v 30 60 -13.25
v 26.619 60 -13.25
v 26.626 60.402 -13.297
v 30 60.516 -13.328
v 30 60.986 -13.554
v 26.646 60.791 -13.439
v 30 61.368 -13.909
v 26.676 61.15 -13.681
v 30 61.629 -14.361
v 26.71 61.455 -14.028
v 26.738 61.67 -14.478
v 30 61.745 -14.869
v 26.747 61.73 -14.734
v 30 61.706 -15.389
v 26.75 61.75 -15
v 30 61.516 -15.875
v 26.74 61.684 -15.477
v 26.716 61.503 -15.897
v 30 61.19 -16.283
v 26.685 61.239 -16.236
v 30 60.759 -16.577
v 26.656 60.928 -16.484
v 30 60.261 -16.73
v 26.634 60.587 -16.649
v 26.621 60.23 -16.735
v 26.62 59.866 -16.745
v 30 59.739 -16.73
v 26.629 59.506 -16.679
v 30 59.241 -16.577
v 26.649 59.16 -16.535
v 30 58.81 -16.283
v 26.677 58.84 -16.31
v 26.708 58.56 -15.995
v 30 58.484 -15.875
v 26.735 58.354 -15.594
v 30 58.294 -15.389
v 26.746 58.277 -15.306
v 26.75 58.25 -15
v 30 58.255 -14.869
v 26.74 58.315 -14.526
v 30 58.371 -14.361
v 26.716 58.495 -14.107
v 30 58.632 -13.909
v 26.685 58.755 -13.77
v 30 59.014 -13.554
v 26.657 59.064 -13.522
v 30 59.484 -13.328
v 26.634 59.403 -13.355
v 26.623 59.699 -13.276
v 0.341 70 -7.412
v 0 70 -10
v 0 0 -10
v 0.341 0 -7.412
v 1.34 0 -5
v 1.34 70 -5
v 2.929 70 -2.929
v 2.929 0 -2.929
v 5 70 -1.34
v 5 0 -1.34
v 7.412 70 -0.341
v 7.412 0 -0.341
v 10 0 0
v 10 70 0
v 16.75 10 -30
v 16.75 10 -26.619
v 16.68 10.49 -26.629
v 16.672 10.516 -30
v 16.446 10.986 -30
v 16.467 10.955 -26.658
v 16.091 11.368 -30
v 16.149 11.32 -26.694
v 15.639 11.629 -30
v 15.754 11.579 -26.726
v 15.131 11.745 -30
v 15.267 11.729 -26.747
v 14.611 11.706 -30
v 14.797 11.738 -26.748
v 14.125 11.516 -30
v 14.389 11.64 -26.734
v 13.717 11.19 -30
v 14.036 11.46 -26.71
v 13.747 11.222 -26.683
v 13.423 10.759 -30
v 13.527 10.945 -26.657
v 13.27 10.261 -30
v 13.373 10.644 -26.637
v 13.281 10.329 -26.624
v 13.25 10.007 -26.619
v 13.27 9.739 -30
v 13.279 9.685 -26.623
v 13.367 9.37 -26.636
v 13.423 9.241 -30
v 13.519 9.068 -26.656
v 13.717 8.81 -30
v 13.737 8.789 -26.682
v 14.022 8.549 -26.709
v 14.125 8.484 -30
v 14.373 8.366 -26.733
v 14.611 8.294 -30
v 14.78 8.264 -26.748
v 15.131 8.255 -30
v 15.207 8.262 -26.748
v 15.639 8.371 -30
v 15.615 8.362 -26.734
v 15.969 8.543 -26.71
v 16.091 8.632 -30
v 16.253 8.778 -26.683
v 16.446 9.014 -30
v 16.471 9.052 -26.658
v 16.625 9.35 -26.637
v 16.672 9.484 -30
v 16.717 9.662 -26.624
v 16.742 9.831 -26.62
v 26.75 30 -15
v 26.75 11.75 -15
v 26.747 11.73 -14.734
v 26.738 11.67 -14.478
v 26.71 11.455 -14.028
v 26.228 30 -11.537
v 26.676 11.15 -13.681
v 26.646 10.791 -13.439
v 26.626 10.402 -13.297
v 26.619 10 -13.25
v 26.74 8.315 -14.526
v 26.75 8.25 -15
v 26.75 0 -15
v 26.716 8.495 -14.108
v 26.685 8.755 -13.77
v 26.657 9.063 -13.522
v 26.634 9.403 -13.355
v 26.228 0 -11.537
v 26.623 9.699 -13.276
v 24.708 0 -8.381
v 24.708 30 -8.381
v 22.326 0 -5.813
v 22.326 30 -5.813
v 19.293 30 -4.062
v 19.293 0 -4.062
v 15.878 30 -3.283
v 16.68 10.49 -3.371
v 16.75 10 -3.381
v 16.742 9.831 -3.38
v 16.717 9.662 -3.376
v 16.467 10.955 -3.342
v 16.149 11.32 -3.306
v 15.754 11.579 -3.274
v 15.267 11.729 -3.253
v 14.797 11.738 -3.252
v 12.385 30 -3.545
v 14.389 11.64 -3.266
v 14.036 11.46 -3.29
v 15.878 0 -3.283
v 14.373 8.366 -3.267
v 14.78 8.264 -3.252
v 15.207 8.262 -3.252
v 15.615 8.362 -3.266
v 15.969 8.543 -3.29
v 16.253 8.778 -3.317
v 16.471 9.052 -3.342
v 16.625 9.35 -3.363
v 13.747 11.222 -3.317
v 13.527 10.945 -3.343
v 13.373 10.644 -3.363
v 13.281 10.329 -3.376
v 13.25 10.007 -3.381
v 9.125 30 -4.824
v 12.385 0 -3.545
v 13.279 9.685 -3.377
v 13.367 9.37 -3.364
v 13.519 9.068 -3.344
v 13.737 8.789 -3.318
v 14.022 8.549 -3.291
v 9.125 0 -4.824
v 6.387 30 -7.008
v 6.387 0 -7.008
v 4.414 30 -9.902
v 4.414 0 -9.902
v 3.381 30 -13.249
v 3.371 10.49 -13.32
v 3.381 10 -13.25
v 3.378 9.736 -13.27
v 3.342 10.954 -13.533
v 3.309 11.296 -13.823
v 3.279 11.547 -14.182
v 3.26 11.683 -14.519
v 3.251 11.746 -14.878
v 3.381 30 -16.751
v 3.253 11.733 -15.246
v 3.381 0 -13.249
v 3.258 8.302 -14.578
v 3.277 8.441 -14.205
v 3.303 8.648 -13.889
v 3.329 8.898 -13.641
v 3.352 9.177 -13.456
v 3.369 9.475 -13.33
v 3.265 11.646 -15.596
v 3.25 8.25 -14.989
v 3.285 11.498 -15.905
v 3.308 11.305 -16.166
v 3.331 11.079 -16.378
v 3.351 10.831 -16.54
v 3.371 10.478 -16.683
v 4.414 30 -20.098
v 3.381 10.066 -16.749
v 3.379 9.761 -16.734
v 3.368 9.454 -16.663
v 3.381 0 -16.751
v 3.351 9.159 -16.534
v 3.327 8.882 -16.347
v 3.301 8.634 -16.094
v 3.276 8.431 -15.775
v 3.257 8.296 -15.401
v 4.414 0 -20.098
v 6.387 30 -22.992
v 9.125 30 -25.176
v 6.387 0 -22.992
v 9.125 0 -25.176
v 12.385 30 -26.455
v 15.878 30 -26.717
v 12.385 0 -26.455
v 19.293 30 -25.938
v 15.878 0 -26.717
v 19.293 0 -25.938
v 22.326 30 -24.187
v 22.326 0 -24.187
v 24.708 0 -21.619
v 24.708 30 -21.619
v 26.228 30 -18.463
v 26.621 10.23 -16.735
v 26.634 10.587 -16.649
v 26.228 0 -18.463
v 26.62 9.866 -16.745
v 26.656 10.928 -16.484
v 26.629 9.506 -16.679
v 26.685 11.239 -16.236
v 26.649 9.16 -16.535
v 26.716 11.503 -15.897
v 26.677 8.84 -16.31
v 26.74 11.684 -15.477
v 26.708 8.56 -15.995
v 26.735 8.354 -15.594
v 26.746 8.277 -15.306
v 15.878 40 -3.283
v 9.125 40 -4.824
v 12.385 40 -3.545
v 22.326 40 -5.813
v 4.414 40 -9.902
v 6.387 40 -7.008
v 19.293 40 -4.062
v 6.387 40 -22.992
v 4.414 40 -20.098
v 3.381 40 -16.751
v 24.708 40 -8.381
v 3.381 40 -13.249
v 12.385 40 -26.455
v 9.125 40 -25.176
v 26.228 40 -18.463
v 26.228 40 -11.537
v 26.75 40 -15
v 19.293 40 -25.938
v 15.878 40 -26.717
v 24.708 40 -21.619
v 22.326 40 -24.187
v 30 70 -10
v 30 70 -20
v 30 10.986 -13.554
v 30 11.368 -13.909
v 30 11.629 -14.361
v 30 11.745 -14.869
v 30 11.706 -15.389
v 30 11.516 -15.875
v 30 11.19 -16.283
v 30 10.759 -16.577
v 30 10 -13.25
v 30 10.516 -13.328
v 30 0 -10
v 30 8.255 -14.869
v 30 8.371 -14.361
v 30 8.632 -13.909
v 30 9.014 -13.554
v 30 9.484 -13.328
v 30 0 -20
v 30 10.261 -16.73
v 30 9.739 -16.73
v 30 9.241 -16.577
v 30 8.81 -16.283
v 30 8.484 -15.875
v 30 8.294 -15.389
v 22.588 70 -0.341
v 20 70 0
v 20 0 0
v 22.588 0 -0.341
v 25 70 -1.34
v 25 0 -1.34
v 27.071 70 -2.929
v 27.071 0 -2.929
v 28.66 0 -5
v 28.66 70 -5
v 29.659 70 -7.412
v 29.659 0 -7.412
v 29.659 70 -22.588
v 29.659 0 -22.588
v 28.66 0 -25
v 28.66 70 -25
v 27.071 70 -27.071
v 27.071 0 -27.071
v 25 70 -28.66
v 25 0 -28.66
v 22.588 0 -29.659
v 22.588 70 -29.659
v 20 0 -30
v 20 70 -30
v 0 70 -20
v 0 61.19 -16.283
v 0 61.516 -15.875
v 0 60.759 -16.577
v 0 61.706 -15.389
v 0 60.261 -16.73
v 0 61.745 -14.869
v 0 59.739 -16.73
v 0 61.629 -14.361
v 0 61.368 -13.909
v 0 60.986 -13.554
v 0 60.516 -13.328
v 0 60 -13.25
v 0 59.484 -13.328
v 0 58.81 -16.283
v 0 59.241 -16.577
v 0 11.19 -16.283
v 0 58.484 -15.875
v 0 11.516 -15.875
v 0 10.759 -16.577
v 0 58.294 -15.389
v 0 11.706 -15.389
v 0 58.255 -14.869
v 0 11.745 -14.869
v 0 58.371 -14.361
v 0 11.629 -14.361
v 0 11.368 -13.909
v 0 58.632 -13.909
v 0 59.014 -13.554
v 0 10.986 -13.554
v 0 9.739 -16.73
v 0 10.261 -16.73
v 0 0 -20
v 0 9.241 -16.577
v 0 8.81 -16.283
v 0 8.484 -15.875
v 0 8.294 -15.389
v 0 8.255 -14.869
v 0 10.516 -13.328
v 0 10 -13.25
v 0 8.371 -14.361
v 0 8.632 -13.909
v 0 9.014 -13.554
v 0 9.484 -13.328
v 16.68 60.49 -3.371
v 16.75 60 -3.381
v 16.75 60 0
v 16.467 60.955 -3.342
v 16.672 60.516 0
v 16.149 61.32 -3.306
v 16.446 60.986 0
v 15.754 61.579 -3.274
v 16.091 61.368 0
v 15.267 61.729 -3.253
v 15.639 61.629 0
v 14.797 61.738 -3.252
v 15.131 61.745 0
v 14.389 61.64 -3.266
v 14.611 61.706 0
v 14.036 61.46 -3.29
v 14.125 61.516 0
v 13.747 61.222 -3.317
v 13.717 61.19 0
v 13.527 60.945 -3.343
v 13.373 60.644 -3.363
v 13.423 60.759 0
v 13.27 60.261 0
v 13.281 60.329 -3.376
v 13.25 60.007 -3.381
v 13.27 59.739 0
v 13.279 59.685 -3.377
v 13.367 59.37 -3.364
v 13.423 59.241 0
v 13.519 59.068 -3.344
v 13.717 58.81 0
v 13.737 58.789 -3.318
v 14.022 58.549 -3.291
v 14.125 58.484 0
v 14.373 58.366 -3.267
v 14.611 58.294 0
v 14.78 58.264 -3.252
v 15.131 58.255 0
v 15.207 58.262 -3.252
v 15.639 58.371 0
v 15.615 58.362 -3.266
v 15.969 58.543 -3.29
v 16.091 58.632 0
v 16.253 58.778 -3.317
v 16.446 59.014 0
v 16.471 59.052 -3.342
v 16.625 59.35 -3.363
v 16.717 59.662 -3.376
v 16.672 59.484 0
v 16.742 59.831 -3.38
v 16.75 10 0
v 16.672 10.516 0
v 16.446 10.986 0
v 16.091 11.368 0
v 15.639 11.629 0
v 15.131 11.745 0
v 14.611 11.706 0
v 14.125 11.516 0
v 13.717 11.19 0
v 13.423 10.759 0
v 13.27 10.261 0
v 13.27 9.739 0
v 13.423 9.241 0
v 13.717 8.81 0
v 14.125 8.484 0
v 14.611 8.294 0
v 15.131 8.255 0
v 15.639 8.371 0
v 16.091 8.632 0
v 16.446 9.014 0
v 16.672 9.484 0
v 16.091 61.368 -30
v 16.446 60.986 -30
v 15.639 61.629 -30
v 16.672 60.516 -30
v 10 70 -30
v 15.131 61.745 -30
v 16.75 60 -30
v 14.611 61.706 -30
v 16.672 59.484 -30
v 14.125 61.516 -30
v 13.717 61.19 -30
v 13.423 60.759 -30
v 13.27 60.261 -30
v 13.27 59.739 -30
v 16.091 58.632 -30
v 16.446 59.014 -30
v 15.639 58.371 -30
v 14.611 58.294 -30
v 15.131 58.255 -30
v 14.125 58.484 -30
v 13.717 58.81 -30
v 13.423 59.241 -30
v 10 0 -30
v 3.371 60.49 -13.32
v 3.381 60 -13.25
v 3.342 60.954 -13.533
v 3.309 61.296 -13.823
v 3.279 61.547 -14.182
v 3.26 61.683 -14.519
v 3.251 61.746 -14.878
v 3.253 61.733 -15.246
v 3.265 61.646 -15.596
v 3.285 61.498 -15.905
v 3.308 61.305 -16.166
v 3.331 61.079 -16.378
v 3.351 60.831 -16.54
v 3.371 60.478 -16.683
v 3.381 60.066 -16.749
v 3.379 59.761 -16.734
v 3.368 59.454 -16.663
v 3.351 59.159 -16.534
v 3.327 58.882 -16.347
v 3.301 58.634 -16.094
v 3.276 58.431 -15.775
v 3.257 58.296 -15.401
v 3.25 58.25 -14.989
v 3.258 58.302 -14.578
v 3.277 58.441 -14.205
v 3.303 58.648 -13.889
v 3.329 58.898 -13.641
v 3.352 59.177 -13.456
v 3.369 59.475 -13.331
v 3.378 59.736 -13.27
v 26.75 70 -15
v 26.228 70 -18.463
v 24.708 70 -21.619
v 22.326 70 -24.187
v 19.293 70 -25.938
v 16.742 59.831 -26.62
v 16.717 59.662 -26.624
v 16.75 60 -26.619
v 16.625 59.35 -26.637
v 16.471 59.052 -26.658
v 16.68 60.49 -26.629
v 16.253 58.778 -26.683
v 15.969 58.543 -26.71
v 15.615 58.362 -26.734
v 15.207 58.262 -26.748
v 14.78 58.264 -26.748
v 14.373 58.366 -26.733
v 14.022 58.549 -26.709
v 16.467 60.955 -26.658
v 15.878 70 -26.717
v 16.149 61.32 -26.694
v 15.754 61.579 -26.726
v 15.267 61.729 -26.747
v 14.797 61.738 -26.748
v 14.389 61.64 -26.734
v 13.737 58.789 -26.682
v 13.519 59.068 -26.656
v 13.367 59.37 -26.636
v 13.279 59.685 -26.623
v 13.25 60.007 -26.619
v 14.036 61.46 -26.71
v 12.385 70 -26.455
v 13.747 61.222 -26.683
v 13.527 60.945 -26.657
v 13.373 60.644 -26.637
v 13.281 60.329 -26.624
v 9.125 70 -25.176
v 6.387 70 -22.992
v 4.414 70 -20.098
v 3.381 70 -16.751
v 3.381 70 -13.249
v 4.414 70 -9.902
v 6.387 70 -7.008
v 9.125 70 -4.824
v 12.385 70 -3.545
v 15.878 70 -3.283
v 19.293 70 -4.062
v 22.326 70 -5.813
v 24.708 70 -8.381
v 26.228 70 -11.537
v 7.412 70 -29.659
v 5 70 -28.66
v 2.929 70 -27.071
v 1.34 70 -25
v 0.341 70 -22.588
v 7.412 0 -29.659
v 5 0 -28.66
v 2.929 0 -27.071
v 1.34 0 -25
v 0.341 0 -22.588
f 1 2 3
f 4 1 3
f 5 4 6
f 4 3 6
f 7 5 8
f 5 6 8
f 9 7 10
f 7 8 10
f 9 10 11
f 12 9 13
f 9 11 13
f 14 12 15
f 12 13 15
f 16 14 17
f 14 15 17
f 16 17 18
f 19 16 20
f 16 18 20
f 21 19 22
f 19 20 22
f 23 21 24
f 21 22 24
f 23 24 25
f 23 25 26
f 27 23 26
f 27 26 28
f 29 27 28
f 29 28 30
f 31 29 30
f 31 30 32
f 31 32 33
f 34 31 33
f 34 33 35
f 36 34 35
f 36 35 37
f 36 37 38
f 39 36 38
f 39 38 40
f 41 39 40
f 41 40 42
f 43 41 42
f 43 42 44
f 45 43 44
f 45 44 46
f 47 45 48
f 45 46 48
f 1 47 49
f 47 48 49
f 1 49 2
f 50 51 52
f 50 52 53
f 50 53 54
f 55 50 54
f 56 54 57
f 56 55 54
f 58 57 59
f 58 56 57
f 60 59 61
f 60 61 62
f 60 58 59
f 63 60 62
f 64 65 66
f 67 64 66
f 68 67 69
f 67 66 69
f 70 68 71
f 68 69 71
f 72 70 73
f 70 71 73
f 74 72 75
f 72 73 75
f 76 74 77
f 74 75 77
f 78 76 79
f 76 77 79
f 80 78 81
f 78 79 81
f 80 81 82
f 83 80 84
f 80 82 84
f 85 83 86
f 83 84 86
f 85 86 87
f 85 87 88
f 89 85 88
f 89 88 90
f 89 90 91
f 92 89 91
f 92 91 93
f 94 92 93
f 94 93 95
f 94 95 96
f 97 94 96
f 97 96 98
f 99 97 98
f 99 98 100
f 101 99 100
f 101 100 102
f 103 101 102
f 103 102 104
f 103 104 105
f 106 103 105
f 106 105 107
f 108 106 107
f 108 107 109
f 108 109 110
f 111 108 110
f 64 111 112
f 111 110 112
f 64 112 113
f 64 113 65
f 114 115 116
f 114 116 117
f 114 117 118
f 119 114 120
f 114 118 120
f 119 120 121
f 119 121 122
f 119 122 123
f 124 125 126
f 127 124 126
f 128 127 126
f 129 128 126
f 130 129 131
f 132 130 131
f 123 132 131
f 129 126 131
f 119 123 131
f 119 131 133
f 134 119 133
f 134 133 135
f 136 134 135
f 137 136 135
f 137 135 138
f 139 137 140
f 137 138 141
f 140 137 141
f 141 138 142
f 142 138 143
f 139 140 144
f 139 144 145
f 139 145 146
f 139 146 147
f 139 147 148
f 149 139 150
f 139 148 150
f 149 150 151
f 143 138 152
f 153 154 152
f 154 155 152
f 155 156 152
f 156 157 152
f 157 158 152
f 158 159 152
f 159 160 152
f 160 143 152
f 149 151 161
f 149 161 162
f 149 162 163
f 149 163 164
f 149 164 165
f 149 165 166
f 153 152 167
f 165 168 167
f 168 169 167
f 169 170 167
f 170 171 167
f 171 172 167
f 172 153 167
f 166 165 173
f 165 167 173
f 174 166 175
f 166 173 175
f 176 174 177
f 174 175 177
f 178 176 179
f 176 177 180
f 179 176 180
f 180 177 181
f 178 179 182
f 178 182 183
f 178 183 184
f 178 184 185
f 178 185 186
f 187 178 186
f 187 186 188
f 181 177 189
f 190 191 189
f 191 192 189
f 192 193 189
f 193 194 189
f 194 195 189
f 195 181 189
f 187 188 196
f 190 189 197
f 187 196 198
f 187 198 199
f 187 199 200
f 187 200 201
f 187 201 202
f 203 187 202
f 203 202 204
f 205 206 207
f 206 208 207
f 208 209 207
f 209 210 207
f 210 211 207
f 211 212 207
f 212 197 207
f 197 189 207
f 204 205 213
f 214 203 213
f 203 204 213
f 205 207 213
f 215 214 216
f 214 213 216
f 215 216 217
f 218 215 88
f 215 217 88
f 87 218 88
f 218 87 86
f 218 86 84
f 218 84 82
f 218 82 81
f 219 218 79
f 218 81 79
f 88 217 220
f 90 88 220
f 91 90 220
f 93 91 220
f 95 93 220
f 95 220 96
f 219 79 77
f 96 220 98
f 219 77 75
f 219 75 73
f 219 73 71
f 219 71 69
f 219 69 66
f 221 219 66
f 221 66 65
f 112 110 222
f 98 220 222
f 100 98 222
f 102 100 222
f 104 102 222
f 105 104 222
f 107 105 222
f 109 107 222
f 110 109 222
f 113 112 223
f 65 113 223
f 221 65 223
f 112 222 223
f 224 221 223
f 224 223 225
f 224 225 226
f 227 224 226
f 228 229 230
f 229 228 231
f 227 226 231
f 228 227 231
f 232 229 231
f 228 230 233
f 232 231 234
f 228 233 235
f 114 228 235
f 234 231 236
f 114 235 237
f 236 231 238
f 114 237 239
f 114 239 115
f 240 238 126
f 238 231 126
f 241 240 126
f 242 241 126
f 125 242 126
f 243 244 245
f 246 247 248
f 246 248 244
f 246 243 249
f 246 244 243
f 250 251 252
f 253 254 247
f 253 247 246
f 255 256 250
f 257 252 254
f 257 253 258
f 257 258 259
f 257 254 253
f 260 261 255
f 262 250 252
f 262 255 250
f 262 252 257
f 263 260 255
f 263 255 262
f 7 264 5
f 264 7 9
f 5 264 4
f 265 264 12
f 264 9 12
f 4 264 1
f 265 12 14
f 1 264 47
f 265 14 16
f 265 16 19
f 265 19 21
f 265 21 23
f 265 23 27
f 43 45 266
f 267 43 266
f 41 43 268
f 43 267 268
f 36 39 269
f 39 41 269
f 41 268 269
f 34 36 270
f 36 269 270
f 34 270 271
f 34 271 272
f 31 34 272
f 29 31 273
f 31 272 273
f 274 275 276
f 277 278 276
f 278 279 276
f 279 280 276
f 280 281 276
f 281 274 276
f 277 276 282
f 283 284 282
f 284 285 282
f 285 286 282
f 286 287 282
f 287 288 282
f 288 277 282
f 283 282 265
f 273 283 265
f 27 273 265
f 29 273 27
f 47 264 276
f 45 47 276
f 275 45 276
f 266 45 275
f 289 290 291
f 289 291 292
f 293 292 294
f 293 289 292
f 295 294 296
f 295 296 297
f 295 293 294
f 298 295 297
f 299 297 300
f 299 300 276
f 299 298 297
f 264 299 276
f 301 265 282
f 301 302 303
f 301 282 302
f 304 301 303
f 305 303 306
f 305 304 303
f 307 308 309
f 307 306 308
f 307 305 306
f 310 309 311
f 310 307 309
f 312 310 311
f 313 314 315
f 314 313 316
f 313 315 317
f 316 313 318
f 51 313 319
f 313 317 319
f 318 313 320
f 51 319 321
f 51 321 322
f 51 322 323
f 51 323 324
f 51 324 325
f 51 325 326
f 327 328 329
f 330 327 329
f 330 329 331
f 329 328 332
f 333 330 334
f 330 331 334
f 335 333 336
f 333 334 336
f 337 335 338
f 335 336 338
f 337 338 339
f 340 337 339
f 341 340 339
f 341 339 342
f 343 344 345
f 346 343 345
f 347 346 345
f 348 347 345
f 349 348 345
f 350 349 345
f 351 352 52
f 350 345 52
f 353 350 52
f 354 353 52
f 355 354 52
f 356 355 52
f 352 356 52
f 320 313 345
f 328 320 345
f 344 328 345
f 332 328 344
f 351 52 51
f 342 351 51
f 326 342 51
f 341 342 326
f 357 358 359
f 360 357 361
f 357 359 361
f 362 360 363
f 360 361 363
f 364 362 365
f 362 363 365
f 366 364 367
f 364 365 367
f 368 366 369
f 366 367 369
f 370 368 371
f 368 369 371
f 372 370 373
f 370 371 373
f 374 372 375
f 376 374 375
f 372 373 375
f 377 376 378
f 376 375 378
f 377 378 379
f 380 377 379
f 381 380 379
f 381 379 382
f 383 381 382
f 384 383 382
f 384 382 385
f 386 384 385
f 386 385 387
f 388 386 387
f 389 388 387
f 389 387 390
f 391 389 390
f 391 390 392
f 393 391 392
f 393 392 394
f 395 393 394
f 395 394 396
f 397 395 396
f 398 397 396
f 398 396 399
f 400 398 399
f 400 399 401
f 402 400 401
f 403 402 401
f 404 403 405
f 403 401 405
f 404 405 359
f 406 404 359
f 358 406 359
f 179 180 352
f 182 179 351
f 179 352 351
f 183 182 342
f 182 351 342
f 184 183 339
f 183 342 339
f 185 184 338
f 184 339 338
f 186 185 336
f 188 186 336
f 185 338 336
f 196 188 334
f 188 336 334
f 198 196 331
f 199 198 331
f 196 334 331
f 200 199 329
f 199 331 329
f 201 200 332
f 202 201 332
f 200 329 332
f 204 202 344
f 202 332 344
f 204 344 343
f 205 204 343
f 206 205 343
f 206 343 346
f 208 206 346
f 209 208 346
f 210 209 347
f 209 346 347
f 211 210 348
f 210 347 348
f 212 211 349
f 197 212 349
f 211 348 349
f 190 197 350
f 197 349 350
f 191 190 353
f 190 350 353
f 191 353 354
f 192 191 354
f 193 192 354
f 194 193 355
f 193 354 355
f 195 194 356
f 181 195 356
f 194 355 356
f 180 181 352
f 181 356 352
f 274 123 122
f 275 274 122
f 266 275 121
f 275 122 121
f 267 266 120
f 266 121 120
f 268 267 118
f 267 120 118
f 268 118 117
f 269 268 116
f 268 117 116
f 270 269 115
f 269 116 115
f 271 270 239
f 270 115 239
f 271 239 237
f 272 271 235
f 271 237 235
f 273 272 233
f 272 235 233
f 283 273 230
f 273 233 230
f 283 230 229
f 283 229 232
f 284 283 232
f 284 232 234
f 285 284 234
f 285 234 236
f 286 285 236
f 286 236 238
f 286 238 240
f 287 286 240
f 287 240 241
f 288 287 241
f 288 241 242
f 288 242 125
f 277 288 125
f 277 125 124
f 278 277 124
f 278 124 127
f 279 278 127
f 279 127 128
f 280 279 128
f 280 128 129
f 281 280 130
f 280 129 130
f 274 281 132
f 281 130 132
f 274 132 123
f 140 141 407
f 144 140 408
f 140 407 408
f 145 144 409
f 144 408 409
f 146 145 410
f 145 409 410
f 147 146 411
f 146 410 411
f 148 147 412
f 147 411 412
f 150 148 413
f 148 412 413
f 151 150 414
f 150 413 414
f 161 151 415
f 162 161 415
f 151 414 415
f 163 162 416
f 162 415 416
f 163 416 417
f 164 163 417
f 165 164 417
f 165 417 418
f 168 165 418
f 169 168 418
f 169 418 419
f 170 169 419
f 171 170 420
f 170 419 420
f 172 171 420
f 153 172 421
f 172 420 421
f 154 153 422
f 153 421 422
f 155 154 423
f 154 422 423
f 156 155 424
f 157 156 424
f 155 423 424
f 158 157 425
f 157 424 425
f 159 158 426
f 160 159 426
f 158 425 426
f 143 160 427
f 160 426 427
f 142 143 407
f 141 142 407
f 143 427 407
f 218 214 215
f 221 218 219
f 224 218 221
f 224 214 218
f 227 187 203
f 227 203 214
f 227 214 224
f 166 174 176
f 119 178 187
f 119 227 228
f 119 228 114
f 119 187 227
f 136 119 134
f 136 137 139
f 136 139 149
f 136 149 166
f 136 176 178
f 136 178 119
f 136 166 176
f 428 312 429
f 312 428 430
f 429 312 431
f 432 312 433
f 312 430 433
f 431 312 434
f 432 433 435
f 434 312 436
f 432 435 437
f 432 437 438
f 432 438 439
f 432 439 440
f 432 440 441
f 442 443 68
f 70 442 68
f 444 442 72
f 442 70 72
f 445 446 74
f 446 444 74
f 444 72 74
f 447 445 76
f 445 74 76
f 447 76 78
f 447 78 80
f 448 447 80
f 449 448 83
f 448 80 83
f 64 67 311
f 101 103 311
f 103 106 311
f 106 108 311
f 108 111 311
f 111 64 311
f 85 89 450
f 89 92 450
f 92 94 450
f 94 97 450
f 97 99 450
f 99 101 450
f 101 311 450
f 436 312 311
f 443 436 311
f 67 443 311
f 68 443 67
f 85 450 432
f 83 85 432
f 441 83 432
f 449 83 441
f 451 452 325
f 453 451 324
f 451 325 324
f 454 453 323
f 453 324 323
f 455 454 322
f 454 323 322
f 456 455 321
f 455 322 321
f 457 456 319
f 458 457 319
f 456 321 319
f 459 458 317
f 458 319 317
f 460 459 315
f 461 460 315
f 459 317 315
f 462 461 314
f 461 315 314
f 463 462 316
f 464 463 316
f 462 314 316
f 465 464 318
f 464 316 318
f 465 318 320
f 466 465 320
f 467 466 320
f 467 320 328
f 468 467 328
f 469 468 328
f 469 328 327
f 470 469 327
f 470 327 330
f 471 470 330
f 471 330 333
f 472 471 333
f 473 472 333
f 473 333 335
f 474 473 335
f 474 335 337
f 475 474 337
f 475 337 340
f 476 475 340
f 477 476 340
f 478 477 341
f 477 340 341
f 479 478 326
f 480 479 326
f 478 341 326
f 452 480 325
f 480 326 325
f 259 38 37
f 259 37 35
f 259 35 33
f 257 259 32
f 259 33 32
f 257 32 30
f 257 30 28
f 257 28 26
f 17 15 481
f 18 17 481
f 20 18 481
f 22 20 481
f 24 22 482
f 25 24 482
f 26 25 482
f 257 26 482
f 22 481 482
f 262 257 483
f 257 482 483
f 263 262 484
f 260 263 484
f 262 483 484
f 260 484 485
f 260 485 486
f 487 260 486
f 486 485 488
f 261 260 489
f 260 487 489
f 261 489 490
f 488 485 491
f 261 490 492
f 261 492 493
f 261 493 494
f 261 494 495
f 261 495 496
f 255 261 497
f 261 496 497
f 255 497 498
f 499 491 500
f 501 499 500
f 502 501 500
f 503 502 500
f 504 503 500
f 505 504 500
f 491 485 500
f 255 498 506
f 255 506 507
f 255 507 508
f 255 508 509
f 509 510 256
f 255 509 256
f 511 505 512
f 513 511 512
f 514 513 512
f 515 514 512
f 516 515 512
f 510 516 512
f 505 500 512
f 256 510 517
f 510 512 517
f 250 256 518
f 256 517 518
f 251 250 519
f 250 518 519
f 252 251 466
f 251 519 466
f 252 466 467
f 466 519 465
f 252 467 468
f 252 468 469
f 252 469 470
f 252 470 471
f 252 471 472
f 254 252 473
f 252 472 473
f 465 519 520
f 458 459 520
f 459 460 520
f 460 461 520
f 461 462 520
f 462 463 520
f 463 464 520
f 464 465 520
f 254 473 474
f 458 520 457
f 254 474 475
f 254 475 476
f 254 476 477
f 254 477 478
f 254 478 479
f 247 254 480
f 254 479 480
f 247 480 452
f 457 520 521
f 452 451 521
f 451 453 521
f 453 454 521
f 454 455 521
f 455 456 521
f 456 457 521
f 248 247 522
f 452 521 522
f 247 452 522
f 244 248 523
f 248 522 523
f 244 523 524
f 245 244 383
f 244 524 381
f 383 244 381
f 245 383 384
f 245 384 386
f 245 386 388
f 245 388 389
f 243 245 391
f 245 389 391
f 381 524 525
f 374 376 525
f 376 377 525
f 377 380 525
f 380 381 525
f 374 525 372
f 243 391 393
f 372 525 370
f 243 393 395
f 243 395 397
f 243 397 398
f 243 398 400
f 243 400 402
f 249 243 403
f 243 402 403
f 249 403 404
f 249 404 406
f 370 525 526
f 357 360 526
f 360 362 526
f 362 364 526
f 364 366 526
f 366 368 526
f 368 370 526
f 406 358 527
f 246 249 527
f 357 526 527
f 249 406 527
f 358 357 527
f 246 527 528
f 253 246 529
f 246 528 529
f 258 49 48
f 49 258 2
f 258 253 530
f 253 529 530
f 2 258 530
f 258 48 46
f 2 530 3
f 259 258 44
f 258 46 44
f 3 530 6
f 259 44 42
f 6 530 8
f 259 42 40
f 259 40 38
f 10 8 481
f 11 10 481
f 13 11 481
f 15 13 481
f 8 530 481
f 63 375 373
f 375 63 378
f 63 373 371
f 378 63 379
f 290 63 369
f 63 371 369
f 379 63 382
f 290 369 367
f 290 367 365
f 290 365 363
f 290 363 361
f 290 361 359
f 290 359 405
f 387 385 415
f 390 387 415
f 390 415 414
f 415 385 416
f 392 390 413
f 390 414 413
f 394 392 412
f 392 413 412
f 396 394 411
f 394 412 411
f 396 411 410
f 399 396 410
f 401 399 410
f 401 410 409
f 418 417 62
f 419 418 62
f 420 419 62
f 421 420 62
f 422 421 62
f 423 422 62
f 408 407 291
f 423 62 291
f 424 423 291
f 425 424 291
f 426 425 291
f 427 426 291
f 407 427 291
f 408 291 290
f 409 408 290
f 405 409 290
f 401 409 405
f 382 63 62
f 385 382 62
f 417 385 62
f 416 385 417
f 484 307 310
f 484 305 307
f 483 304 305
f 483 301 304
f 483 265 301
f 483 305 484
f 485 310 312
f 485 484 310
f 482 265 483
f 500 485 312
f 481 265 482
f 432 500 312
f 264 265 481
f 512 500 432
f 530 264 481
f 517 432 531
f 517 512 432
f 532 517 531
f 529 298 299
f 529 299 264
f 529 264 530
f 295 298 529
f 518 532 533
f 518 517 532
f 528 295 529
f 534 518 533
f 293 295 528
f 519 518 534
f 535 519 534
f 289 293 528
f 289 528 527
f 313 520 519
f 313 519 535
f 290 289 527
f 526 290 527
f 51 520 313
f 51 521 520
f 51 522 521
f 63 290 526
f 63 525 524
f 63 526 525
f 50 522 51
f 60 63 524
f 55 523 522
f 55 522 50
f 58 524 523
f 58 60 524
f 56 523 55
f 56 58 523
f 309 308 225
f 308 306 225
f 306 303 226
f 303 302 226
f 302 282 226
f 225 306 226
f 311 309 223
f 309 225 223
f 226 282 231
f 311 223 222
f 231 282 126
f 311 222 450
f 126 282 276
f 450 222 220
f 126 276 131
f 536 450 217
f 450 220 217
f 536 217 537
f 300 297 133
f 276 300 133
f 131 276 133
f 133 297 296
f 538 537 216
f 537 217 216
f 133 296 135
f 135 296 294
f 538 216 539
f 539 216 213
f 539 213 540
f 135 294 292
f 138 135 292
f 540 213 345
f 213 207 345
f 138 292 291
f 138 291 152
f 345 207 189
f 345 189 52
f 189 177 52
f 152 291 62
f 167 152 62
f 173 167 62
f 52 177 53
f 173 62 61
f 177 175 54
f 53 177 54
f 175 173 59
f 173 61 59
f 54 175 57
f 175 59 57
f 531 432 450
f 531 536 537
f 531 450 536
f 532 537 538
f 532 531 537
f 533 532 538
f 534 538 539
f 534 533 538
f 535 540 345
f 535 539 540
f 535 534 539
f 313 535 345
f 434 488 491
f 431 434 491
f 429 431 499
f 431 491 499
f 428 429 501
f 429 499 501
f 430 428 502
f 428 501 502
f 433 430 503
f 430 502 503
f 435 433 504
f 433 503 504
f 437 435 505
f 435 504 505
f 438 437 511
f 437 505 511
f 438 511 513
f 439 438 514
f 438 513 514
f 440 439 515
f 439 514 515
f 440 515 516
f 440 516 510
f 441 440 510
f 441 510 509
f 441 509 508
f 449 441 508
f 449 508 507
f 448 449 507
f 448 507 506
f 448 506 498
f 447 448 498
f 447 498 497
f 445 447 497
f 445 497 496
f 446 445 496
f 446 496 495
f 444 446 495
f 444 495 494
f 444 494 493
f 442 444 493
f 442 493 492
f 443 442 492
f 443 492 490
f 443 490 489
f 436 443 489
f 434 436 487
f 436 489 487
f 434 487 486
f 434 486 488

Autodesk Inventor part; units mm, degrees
ref_plane "YZ Plane" through (0, 0, 0) normal (1, 0, 0) x (0, 1, 0)
ref_plane "XZ Plane" through (0, 0, 0) normal (0, 1, 0) x (-1, 0, 0)
ref_plane "XY Plane" through (0, 0, 0) normal (0, 0, 1) x (1, 0, 0)
sketch "Sketch1" plane through (0, 0, 0) normal (0, 1, 0) x (-1, 0, 0)
  line L0 (0, 0) -> (-30, 0)
  line L1 (-30, 0) -> (-30, -30)
  line L2 (-30, -30) -> (0, -30)
  line L3 (0, -30) -> (0, 0)
  dimension "d0" = 30
  dimension "d1" = 30
extrude "Extrusion1" add sketch "Sketch1" along normal blind 70
sketch "Sketch2" plane through (0, 70, 0) normal (0, 1, 0) x (1, 0, 0)
  line L0 (0, 30) -> (0, 0) construction
  line L1 (0, 0) -> (30, 0) construction
  line L2 (0, 30) -> (30, 0) construction
  circle A0 centre (15, 15) radius 11.75
  dimension "d4" = 23.5
extrude "Extrusion2" cut sketch "Sketch2" against normal blind 30
sketch "Sketch3" plane through (0, 0, 0) normal (0, -1, 0) x (1, 0, 0)
  line L0 (30, -30) -> (0, -30) construction
  line L1 (30, -30) -> (0, 0) construction
  circle A0 centre (15, -15) radius 11.75
  dimension "d7" = 23.5
extrude "Extrusion3" cut sketch "Sketch3" against normal blind 30
sketch "Sketch4" plane through (0, 0, 0) normal (0, 0, 1) x (1, 0, 0)
  circle A0 centre (15, 60) radius 1.75
  line L0 (0, 70) -> (30, 70) projected
  circle A1 centre (15, 10) radius 1.75
  line L1 (0, 0) -> (30, 0) projected
  dimension "d10" = 3.5
  dimension "d11" = 10
  dimension "d12" = 3.5
  dimension "d13" = 10
extrude "Extrusion4" cut sketch "Sketch4" against normal blind 32
sketch "Sketch5" plane through (0, 0, -30) normal (-1, 0, 0) x (0, 0, 1)
  circle A0 centre (15, 60) radius 1.75
  circle A1 centre (15, 10) radius 1.75
  line L0 (0, 70) -> (30, 70) projected
  line L1 (0, 0) -> (30, 0) projected
  dimension "d16" = 3.5
  dimension "d17" = 3.5
  dimension "d18" = 10
  dimension "d19" = 10
extrude "Extrusion5" cut sketch "Sketch5" against normal blind 32
fillet "Fillet1" radius 10 4 edges at (30, 35, 0) (30, 35, -30) (0, 35, -30) (0, 35, 0)
properties part number "Rod_Joint_v2"
